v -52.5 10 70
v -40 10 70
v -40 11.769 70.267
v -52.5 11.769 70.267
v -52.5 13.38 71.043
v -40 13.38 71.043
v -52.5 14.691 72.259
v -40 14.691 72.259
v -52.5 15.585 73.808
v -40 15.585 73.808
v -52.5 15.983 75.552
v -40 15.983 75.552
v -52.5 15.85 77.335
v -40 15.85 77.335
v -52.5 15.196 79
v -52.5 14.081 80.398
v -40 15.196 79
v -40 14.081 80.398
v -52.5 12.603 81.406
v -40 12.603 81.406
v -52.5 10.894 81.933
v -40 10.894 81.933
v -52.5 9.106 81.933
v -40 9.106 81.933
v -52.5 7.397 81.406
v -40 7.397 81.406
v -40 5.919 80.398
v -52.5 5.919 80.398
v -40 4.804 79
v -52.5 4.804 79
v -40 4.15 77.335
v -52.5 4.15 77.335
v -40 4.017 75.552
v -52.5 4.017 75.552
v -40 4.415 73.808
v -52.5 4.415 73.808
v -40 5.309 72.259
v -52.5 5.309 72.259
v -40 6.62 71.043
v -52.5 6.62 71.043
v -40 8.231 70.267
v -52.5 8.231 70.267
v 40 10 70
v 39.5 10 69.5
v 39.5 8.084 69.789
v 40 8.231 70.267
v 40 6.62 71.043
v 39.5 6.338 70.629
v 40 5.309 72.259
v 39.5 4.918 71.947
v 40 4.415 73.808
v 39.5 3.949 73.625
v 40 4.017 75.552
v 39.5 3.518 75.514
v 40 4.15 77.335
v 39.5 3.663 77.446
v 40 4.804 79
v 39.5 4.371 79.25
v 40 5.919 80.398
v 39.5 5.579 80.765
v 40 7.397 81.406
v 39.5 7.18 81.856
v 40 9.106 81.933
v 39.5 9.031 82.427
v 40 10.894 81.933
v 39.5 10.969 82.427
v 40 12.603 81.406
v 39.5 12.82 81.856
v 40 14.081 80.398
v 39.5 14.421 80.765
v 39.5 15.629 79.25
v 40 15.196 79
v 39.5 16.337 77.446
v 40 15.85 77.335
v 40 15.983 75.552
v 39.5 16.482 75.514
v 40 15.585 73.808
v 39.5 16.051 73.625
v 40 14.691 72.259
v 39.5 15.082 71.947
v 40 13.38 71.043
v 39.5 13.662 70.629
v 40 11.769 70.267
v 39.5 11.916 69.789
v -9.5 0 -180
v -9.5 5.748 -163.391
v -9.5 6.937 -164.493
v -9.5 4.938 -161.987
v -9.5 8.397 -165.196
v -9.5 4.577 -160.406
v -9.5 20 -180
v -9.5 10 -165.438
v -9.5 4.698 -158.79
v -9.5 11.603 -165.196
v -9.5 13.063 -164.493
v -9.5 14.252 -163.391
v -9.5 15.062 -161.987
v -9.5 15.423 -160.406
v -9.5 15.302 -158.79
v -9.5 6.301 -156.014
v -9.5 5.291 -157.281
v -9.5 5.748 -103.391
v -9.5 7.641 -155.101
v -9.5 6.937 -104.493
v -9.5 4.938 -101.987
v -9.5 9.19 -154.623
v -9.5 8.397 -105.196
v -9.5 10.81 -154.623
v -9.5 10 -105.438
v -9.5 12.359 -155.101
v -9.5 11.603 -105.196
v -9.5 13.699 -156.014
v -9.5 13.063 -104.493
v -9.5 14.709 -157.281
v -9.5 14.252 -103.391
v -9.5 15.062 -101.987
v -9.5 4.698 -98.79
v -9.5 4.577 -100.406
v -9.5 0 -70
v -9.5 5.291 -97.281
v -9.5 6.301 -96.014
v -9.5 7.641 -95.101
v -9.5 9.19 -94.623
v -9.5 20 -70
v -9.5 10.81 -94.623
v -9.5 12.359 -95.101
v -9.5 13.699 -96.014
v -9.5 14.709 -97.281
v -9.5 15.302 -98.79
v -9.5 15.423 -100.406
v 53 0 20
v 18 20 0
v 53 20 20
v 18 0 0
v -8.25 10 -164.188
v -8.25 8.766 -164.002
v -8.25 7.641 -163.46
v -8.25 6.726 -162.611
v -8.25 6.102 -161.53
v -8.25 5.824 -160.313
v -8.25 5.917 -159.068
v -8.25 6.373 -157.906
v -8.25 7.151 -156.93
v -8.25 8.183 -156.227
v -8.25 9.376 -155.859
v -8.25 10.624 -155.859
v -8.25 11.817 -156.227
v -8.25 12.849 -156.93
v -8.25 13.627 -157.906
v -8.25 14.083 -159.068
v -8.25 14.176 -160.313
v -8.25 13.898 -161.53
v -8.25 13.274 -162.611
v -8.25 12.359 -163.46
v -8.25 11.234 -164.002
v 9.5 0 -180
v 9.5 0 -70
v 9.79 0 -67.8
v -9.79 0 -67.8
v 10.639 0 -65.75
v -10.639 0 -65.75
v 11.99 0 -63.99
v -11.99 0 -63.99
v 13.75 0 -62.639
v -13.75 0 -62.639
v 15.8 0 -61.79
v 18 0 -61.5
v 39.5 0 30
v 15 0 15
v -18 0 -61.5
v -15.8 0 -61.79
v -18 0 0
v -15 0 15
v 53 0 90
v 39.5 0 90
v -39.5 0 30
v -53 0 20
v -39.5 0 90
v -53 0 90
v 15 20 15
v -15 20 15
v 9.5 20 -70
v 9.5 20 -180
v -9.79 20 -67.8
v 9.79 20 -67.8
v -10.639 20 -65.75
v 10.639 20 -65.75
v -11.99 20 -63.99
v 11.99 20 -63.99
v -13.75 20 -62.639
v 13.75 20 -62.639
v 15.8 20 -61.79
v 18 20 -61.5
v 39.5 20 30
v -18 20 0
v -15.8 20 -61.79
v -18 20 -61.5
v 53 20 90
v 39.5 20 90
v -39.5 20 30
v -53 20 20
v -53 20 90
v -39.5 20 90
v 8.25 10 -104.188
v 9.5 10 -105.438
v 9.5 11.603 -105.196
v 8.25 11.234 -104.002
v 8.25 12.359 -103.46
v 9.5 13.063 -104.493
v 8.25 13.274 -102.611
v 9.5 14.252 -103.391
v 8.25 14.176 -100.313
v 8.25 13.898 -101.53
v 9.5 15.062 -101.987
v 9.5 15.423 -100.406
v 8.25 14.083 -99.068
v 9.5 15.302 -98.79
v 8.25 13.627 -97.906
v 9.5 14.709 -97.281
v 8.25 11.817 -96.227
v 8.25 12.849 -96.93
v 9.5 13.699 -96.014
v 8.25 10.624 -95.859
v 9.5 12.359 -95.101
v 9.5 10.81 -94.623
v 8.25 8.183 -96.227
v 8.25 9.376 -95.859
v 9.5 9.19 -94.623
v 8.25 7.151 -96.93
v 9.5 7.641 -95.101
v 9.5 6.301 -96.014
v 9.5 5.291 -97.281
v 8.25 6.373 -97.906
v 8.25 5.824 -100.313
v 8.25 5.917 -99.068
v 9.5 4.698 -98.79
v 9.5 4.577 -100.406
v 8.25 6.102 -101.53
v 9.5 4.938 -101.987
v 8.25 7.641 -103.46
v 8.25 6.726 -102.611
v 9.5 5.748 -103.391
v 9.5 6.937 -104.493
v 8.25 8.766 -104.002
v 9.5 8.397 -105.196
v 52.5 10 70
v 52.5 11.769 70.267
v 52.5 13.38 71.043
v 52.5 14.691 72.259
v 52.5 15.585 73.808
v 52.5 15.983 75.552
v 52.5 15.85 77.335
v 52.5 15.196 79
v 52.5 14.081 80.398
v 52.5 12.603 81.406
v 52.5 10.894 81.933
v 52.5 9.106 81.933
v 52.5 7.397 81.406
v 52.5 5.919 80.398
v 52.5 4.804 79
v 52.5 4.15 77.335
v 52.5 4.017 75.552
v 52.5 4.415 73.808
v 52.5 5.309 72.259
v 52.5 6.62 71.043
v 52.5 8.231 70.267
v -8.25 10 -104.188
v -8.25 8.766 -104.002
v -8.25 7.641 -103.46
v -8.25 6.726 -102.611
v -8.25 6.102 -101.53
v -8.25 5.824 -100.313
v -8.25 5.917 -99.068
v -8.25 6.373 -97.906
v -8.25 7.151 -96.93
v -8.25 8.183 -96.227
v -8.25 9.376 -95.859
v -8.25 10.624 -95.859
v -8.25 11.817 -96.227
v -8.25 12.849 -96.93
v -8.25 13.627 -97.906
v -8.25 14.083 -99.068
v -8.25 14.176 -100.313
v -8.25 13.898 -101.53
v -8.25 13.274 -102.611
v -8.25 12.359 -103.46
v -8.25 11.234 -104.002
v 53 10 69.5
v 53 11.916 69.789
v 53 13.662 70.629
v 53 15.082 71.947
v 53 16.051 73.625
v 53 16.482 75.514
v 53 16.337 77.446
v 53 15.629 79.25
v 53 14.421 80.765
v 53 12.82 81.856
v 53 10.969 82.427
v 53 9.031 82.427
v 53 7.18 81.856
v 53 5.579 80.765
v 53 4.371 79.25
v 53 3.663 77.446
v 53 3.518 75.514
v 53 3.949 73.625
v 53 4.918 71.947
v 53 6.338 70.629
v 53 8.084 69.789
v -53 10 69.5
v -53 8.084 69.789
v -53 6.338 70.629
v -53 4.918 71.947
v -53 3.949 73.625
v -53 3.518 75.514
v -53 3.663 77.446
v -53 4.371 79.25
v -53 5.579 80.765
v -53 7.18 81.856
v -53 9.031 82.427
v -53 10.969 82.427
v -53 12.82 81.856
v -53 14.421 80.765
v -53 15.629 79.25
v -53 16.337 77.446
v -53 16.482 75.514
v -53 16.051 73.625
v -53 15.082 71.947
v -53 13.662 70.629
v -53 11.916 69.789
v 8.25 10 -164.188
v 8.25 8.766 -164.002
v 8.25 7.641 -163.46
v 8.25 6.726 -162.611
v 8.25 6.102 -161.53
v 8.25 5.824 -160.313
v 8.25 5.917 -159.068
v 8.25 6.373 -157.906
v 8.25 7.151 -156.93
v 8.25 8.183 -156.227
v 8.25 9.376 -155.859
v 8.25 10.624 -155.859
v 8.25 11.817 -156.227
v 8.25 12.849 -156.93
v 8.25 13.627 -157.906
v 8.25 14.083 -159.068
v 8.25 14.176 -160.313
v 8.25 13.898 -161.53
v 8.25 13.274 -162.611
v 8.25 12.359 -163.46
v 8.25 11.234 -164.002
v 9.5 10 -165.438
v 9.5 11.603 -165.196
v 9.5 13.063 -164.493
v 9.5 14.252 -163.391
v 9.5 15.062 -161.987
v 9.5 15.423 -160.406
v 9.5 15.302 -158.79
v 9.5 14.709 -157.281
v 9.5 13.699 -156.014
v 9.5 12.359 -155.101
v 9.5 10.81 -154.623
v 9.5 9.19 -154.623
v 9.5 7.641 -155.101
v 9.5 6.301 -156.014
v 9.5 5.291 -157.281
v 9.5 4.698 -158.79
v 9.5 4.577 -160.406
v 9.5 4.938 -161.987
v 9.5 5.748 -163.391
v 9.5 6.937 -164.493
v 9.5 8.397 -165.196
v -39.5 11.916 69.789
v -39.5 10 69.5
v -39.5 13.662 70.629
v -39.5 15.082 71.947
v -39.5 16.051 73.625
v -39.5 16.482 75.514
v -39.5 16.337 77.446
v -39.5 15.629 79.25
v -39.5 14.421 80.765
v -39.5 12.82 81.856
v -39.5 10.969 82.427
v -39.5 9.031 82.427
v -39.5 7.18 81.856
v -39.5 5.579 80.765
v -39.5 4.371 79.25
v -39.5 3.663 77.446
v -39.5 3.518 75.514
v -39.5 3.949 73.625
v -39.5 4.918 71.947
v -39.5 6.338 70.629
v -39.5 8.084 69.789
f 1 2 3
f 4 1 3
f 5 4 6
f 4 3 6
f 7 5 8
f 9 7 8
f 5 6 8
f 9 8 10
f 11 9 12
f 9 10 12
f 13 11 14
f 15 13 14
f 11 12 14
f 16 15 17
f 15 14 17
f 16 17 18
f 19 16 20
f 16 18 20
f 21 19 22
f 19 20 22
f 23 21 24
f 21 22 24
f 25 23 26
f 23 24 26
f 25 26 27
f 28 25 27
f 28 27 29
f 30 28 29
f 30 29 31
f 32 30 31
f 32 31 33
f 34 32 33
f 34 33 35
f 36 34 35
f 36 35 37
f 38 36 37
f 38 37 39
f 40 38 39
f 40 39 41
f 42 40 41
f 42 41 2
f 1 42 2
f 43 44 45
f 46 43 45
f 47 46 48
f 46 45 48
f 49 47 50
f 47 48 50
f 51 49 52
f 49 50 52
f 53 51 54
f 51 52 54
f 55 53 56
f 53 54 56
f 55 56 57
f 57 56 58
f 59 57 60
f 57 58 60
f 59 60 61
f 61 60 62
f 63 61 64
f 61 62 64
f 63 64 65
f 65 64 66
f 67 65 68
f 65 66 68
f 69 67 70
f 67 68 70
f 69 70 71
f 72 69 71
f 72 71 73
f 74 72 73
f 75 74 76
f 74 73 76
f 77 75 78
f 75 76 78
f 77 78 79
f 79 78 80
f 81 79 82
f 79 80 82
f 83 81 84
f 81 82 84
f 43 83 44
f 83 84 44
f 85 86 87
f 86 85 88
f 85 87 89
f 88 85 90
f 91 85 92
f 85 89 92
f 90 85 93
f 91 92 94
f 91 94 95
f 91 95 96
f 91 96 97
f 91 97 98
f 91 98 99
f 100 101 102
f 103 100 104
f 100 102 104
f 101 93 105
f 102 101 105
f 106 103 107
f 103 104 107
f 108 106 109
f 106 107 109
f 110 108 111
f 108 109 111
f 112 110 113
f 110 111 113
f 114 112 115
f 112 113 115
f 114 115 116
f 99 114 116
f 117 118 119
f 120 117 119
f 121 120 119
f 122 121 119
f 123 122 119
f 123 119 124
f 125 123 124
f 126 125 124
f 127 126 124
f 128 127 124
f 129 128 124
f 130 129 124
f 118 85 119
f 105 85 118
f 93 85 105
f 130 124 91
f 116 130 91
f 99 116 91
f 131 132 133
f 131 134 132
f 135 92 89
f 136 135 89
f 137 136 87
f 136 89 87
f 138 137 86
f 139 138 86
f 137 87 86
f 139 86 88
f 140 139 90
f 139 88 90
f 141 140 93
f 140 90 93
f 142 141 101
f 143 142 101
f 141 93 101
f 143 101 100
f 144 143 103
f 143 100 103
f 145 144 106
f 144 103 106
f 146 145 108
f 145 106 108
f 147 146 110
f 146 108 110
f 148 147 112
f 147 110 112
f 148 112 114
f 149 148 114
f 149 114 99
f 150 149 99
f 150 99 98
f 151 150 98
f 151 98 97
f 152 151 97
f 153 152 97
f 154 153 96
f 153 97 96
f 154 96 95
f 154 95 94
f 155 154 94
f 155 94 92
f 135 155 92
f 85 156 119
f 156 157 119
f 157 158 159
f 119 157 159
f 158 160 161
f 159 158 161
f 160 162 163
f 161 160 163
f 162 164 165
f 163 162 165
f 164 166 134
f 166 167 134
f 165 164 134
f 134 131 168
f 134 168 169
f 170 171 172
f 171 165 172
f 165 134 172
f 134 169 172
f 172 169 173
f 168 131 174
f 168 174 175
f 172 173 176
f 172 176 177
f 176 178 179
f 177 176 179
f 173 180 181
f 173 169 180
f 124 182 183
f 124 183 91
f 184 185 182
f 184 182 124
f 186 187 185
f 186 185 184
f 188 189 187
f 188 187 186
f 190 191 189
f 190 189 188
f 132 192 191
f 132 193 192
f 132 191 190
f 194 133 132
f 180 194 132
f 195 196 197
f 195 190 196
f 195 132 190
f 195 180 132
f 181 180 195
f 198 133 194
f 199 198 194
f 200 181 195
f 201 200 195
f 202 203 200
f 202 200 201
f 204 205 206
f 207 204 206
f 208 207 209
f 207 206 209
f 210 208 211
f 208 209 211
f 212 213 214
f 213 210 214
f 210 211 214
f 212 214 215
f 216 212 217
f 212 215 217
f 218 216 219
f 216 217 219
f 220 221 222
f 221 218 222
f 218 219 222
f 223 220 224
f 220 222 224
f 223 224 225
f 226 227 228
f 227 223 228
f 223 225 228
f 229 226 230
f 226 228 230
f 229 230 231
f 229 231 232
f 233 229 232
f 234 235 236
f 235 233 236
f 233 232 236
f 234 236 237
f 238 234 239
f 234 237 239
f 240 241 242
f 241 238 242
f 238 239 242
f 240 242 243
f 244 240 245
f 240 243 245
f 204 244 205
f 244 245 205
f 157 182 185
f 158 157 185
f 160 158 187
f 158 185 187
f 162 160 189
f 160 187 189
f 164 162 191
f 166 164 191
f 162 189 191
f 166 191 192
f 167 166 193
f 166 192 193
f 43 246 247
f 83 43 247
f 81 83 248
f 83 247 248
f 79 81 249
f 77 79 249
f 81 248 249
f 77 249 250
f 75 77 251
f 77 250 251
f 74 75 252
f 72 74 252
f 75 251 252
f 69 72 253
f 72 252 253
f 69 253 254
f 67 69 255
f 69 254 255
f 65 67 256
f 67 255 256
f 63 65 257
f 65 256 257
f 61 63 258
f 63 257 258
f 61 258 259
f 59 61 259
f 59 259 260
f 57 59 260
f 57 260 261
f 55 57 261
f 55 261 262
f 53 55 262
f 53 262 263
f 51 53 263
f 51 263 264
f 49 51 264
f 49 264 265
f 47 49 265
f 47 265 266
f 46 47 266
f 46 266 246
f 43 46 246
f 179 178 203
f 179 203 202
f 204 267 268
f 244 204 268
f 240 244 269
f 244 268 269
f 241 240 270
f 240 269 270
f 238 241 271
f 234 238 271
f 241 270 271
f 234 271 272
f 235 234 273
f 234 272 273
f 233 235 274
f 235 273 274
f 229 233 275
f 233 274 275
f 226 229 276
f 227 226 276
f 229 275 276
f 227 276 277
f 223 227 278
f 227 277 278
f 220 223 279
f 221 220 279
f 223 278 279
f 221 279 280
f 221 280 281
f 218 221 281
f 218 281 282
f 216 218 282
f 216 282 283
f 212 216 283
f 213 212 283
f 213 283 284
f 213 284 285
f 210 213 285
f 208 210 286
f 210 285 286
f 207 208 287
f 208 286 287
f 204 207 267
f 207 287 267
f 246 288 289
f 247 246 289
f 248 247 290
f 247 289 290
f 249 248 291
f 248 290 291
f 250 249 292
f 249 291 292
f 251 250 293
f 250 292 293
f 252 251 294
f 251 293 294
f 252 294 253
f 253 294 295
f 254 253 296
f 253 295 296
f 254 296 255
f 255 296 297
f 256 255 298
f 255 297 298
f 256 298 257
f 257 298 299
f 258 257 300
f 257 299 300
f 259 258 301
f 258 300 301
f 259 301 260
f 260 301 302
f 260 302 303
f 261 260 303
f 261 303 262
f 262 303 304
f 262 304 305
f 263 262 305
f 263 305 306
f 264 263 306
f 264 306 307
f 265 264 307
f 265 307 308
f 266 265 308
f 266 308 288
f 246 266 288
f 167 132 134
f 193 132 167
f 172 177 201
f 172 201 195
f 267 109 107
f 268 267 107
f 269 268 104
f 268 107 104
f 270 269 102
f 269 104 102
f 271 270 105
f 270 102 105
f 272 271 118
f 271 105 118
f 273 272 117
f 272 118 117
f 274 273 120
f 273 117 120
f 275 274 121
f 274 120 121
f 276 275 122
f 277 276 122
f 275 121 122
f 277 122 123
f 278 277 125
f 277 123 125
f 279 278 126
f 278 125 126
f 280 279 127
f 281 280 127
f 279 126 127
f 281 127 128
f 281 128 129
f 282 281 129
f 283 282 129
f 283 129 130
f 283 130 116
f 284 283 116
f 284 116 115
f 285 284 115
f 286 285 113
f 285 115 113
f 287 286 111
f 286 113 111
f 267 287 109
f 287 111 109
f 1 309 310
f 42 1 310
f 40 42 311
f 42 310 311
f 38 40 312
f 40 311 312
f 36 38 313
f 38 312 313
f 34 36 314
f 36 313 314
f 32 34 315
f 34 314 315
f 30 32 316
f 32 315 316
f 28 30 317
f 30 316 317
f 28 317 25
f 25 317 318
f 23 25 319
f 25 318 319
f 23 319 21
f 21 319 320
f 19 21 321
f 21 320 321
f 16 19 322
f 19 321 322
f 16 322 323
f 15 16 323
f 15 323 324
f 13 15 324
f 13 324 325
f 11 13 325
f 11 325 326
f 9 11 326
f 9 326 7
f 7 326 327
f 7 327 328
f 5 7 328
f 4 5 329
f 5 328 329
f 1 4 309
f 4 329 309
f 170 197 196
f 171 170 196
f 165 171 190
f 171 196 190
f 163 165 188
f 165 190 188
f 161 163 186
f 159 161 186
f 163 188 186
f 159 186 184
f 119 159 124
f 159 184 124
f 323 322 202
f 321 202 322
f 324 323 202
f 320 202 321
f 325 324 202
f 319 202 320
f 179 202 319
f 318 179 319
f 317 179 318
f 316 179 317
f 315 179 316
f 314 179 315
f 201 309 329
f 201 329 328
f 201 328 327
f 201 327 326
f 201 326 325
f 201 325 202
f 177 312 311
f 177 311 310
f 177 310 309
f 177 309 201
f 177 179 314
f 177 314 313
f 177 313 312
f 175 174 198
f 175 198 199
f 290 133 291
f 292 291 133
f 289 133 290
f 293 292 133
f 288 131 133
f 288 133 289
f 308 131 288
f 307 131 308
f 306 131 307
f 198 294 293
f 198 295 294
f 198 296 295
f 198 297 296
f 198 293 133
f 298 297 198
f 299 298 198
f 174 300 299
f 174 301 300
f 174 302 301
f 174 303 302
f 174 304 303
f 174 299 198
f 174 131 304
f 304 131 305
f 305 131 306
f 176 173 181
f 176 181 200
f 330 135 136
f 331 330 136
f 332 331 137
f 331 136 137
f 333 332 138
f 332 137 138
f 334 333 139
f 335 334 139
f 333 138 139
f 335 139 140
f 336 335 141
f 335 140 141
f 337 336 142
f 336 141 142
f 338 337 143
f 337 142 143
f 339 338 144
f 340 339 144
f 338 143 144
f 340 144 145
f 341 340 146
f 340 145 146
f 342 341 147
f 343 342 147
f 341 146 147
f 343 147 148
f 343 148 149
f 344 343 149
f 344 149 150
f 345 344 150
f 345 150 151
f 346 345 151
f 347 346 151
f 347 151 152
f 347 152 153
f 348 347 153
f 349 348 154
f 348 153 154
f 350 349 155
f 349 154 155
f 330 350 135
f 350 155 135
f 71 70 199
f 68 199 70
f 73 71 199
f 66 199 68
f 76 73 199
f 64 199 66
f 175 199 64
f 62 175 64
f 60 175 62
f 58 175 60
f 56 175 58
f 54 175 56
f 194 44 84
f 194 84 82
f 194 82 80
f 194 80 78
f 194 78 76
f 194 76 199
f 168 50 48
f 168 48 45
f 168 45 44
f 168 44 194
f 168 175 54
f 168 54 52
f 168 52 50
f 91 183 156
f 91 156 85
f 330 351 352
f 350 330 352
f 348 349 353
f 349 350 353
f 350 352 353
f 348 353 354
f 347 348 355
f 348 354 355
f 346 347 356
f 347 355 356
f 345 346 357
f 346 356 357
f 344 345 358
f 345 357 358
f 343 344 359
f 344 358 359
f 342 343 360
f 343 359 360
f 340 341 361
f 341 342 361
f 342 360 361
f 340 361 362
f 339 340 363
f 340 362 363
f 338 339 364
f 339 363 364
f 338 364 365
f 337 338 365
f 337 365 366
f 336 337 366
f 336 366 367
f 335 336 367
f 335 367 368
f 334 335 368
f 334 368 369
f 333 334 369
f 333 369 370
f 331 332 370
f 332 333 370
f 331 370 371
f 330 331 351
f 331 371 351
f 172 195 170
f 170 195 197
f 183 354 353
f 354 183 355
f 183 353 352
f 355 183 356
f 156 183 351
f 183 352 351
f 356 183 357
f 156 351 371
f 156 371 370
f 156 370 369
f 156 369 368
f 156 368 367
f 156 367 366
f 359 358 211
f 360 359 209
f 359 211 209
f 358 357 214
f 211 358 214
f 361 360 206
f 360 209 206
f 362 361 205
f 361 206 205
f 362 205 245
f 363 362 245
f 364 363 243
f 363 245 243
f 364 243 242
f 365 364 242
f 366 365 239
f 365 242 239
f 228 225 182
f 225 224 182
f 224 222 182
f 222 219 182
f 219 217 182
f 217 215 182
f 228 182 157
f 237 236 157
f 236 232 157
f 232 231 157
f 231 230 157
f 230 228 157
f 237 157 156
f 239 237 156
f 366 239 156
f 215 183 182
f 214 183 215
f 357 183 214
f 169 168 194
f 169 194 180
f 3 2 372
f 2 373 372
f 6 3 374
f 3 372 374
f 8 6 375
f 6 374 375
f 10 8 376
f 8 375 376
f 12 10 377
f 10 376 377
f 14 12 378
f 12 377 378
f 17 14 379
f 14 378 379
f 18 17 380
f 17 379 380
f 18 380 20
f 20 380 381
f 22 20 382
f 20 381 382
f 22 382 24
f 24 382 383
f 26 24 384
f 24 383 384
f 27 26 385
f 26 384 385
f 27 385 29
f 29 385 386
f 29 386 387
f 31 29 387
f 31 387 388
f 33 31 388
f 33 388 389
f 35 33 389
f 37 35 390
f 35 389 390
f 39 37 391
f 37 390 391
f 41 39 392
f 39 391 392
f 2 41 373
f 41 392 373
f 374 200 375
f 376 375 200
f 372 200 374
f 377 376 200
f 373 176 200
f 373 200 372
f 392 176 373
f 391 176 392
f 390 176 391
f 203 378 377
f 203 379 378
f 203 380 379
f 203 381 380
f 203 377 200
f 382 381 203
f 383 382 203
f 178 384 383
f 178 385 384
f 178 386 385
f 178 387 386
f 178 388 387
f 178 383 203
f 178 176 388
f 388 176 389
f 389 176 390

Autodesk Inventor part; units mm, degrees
ref_plane "YZ Plane" through (0, 0, 0) normal (1, 0, 0) x (0, 1, 0)
sketch "Skizze1" plane through (0, 0, 0) normal (0, 1, 0) x (-1, 0, 0)
  line L0 (53, 90) -> (53, 20)
  line L1 (53, 20) -> (18, 0)
  line L2 (18, 0) -> (-18, 0)
  line L3 (-18, 0) -> (-53, 20)
  line L4 (-53, 20) -> (-53, 90)
  line L5 (-53, 90) -> (-39.5, 90)
  line L6 (-39.5, 90) -> (-39.5, 30)
  line L7 (-39.5, 30) -> (-15, 15)
  line L8 (-15, 15) -> (15, 15)
  line L9 (15, 15) -> (39.5, 30)
  line L10 (39.5, 30) -> (39.5, 90)
  line L11 (39.5, 90) -> (53, 90)
  line L12 (0, -234) -> (0, 144) construction
  point P0 (0, 0)
  dimension "d0" = 79
  dimension "d1" = 13.5
  dimension "d2" = 13.5
  dimension "d3" = 90
  dimension "d5" = 60
  dimension "d6" = 15
  dimension "d7" = 60
  dimension "d8" = 70
  dimension "d9" = 70
  dimension "d12" = 15
  dimension "d13" = 15
  dimension "d14" = 18
  dimension "d15" = 18
extrude "Extrusion1" add sketch "Skizze1" along normal blind 20
sketch "Skizze2" plane through (18, 0, 0) normal (0, 0, -1) x (-1, 0, 0)
  line L0 (57.5, 20) -> (33, 20) construction
  line L1 (8.5, 0) -> (27.5, 0)
  line L2 (27.5, 0) -> (27.5, 20)
  line L3 (27.5, 20) -> (8.5, 20)
  line L4 (8.5, 20) -> (8.5, 0)
  line L5 (18, -4) -> (18, 24) construction
  line L6 (0, 0) -> (36, 0) construction
  point P0 (18, 0)
  point P1 (18, 0)
  point P2 (18, 20)
  dimension "d75" = 19
extrude "Extrusion2" add sketch "Skizze2" along normal blind 180
ref_plane "Arbeitsebene1" through (53.5, 2, 88) normal (1, 0, 0) x (0, 0, -1)
sketch "Skizze3" plane through (53, 0, 90) normal (1, 0, 0) x (0, 0, -1)
  line L0 (0, 10) -> (14, 10) construction
  line L1 (0, 0) -> (0, 20) construction
  circle A0 centre (14, 10) radius 6
  dimension "d44" = 14
  dimension "d87" = 12
extrude "Extrusion3" cut sketch "Skizze3" against normal through all
ref_plane "Arbeitsebene5" through (18, 0, -160) normal (0, 0, -1) x (-1, 0, 0)
ref_plane "Arbeitsebene6" through (18, 0, -100) normal (0, 0, -1) x (-1, 0, 0)
ref_plane "Arbeitsebene7" through (18, 0, -130) normal (0, 0, -1) x (-1, 0, 0)
sketch "Skizze13" plane through (9.5, 0, 0) normal (1, 0, 0) x (0, 0, -1)
  line L0 (160, 24) -> (160, -4) construction
  line L1 (100, 24) -> (100, -4) construction
  line L2 (180, 0) -> (180, 20) construction
  line L3 (180, 10) -> (100, 10) construction
  point P0 (0, 0)
  point P1 (160, 10)
hole "Bohrung2" at (9.5, 10, -100) at (9.5, 10, -160) direction (-1, 0, 0) diameter 8.376 end through all thread size "M10x1.5" class "6H" standard "ISO Metric profile"
sketch "Skizze11" plane through (0, 20, 0) normal (0, 1, 0) x (1, 0, 0)
  line L0 (9.5, 0) -> (18, 0)
  line L1 (18, 0) -> (18, 61.5)
  line L2 (9.5, 70) -> (9.5, 0)
  line L3 (-9.5, 0) -> (-9.5, 180) projected
  line L4 (-9.5, 0) -> (-18, 0)
  line L5 (-18, 0) -> (-18, 61.5)
  line L6 (-9.5, 70) -> (-9.5, 0)
  arc A0 (9.5, 70) -> (18, 61.5) centre (18, 70) ccw
  arc A1 (-18, 61.5) -> (-9.5, 70) centre (-18, 70) ccw
  point P0 (0, 0)
  point P1 (-9.5, 70)
  dimension "d80" = 70
  dimension "d81" = 70
extrude "Extrusion7" add sketch "Skizze11" against normal up to surface (20 mm away)
sketch "Skizze12" plane through (18, 0, -180) normal (0, 0, -1) x (-1, 0, 0)
  line L0 (27.5, 20) -> (8.5, 20) construction
  point P0 (18, 0)
  dimension "Gabel_FixierungPart_Width" = 19
chamfer "Fase1" distance 1.25 angle 45 4 edges at (9.5, 10, -155.812) (9.5, 10, -95.812) (-9.5, 10, -155.812) (-9.5, 10, -95.812)
chamfer "Fase2" distance 0.5 angle 45 4 edges at (53, 10, 82) (39.5, 10, 82) (-53, 10, 82) (-39.5, 10, 82)
equation "\"d1\" = d2"
equation "\"d75\" = ParallelMecha_Contact_Dist - 2 * Gabel_FixationShaft_Contact_Thickness"
equation "\"d81\" = d80"
equation "\"Fixation_dist2\" = -Total_Bearing_Hole_Dist"
equation "\"ParallelMecha_Contact_Dist\" = 26"
equation "\"Gabel_FixationShaft_Contact_Thickness\" = 3.5"
equation "\"Total_Bearing_Hole_Dist\" = 60"
properties part number "Adaptationhorizontalachse" material "Aluminum 6061-AHC"
